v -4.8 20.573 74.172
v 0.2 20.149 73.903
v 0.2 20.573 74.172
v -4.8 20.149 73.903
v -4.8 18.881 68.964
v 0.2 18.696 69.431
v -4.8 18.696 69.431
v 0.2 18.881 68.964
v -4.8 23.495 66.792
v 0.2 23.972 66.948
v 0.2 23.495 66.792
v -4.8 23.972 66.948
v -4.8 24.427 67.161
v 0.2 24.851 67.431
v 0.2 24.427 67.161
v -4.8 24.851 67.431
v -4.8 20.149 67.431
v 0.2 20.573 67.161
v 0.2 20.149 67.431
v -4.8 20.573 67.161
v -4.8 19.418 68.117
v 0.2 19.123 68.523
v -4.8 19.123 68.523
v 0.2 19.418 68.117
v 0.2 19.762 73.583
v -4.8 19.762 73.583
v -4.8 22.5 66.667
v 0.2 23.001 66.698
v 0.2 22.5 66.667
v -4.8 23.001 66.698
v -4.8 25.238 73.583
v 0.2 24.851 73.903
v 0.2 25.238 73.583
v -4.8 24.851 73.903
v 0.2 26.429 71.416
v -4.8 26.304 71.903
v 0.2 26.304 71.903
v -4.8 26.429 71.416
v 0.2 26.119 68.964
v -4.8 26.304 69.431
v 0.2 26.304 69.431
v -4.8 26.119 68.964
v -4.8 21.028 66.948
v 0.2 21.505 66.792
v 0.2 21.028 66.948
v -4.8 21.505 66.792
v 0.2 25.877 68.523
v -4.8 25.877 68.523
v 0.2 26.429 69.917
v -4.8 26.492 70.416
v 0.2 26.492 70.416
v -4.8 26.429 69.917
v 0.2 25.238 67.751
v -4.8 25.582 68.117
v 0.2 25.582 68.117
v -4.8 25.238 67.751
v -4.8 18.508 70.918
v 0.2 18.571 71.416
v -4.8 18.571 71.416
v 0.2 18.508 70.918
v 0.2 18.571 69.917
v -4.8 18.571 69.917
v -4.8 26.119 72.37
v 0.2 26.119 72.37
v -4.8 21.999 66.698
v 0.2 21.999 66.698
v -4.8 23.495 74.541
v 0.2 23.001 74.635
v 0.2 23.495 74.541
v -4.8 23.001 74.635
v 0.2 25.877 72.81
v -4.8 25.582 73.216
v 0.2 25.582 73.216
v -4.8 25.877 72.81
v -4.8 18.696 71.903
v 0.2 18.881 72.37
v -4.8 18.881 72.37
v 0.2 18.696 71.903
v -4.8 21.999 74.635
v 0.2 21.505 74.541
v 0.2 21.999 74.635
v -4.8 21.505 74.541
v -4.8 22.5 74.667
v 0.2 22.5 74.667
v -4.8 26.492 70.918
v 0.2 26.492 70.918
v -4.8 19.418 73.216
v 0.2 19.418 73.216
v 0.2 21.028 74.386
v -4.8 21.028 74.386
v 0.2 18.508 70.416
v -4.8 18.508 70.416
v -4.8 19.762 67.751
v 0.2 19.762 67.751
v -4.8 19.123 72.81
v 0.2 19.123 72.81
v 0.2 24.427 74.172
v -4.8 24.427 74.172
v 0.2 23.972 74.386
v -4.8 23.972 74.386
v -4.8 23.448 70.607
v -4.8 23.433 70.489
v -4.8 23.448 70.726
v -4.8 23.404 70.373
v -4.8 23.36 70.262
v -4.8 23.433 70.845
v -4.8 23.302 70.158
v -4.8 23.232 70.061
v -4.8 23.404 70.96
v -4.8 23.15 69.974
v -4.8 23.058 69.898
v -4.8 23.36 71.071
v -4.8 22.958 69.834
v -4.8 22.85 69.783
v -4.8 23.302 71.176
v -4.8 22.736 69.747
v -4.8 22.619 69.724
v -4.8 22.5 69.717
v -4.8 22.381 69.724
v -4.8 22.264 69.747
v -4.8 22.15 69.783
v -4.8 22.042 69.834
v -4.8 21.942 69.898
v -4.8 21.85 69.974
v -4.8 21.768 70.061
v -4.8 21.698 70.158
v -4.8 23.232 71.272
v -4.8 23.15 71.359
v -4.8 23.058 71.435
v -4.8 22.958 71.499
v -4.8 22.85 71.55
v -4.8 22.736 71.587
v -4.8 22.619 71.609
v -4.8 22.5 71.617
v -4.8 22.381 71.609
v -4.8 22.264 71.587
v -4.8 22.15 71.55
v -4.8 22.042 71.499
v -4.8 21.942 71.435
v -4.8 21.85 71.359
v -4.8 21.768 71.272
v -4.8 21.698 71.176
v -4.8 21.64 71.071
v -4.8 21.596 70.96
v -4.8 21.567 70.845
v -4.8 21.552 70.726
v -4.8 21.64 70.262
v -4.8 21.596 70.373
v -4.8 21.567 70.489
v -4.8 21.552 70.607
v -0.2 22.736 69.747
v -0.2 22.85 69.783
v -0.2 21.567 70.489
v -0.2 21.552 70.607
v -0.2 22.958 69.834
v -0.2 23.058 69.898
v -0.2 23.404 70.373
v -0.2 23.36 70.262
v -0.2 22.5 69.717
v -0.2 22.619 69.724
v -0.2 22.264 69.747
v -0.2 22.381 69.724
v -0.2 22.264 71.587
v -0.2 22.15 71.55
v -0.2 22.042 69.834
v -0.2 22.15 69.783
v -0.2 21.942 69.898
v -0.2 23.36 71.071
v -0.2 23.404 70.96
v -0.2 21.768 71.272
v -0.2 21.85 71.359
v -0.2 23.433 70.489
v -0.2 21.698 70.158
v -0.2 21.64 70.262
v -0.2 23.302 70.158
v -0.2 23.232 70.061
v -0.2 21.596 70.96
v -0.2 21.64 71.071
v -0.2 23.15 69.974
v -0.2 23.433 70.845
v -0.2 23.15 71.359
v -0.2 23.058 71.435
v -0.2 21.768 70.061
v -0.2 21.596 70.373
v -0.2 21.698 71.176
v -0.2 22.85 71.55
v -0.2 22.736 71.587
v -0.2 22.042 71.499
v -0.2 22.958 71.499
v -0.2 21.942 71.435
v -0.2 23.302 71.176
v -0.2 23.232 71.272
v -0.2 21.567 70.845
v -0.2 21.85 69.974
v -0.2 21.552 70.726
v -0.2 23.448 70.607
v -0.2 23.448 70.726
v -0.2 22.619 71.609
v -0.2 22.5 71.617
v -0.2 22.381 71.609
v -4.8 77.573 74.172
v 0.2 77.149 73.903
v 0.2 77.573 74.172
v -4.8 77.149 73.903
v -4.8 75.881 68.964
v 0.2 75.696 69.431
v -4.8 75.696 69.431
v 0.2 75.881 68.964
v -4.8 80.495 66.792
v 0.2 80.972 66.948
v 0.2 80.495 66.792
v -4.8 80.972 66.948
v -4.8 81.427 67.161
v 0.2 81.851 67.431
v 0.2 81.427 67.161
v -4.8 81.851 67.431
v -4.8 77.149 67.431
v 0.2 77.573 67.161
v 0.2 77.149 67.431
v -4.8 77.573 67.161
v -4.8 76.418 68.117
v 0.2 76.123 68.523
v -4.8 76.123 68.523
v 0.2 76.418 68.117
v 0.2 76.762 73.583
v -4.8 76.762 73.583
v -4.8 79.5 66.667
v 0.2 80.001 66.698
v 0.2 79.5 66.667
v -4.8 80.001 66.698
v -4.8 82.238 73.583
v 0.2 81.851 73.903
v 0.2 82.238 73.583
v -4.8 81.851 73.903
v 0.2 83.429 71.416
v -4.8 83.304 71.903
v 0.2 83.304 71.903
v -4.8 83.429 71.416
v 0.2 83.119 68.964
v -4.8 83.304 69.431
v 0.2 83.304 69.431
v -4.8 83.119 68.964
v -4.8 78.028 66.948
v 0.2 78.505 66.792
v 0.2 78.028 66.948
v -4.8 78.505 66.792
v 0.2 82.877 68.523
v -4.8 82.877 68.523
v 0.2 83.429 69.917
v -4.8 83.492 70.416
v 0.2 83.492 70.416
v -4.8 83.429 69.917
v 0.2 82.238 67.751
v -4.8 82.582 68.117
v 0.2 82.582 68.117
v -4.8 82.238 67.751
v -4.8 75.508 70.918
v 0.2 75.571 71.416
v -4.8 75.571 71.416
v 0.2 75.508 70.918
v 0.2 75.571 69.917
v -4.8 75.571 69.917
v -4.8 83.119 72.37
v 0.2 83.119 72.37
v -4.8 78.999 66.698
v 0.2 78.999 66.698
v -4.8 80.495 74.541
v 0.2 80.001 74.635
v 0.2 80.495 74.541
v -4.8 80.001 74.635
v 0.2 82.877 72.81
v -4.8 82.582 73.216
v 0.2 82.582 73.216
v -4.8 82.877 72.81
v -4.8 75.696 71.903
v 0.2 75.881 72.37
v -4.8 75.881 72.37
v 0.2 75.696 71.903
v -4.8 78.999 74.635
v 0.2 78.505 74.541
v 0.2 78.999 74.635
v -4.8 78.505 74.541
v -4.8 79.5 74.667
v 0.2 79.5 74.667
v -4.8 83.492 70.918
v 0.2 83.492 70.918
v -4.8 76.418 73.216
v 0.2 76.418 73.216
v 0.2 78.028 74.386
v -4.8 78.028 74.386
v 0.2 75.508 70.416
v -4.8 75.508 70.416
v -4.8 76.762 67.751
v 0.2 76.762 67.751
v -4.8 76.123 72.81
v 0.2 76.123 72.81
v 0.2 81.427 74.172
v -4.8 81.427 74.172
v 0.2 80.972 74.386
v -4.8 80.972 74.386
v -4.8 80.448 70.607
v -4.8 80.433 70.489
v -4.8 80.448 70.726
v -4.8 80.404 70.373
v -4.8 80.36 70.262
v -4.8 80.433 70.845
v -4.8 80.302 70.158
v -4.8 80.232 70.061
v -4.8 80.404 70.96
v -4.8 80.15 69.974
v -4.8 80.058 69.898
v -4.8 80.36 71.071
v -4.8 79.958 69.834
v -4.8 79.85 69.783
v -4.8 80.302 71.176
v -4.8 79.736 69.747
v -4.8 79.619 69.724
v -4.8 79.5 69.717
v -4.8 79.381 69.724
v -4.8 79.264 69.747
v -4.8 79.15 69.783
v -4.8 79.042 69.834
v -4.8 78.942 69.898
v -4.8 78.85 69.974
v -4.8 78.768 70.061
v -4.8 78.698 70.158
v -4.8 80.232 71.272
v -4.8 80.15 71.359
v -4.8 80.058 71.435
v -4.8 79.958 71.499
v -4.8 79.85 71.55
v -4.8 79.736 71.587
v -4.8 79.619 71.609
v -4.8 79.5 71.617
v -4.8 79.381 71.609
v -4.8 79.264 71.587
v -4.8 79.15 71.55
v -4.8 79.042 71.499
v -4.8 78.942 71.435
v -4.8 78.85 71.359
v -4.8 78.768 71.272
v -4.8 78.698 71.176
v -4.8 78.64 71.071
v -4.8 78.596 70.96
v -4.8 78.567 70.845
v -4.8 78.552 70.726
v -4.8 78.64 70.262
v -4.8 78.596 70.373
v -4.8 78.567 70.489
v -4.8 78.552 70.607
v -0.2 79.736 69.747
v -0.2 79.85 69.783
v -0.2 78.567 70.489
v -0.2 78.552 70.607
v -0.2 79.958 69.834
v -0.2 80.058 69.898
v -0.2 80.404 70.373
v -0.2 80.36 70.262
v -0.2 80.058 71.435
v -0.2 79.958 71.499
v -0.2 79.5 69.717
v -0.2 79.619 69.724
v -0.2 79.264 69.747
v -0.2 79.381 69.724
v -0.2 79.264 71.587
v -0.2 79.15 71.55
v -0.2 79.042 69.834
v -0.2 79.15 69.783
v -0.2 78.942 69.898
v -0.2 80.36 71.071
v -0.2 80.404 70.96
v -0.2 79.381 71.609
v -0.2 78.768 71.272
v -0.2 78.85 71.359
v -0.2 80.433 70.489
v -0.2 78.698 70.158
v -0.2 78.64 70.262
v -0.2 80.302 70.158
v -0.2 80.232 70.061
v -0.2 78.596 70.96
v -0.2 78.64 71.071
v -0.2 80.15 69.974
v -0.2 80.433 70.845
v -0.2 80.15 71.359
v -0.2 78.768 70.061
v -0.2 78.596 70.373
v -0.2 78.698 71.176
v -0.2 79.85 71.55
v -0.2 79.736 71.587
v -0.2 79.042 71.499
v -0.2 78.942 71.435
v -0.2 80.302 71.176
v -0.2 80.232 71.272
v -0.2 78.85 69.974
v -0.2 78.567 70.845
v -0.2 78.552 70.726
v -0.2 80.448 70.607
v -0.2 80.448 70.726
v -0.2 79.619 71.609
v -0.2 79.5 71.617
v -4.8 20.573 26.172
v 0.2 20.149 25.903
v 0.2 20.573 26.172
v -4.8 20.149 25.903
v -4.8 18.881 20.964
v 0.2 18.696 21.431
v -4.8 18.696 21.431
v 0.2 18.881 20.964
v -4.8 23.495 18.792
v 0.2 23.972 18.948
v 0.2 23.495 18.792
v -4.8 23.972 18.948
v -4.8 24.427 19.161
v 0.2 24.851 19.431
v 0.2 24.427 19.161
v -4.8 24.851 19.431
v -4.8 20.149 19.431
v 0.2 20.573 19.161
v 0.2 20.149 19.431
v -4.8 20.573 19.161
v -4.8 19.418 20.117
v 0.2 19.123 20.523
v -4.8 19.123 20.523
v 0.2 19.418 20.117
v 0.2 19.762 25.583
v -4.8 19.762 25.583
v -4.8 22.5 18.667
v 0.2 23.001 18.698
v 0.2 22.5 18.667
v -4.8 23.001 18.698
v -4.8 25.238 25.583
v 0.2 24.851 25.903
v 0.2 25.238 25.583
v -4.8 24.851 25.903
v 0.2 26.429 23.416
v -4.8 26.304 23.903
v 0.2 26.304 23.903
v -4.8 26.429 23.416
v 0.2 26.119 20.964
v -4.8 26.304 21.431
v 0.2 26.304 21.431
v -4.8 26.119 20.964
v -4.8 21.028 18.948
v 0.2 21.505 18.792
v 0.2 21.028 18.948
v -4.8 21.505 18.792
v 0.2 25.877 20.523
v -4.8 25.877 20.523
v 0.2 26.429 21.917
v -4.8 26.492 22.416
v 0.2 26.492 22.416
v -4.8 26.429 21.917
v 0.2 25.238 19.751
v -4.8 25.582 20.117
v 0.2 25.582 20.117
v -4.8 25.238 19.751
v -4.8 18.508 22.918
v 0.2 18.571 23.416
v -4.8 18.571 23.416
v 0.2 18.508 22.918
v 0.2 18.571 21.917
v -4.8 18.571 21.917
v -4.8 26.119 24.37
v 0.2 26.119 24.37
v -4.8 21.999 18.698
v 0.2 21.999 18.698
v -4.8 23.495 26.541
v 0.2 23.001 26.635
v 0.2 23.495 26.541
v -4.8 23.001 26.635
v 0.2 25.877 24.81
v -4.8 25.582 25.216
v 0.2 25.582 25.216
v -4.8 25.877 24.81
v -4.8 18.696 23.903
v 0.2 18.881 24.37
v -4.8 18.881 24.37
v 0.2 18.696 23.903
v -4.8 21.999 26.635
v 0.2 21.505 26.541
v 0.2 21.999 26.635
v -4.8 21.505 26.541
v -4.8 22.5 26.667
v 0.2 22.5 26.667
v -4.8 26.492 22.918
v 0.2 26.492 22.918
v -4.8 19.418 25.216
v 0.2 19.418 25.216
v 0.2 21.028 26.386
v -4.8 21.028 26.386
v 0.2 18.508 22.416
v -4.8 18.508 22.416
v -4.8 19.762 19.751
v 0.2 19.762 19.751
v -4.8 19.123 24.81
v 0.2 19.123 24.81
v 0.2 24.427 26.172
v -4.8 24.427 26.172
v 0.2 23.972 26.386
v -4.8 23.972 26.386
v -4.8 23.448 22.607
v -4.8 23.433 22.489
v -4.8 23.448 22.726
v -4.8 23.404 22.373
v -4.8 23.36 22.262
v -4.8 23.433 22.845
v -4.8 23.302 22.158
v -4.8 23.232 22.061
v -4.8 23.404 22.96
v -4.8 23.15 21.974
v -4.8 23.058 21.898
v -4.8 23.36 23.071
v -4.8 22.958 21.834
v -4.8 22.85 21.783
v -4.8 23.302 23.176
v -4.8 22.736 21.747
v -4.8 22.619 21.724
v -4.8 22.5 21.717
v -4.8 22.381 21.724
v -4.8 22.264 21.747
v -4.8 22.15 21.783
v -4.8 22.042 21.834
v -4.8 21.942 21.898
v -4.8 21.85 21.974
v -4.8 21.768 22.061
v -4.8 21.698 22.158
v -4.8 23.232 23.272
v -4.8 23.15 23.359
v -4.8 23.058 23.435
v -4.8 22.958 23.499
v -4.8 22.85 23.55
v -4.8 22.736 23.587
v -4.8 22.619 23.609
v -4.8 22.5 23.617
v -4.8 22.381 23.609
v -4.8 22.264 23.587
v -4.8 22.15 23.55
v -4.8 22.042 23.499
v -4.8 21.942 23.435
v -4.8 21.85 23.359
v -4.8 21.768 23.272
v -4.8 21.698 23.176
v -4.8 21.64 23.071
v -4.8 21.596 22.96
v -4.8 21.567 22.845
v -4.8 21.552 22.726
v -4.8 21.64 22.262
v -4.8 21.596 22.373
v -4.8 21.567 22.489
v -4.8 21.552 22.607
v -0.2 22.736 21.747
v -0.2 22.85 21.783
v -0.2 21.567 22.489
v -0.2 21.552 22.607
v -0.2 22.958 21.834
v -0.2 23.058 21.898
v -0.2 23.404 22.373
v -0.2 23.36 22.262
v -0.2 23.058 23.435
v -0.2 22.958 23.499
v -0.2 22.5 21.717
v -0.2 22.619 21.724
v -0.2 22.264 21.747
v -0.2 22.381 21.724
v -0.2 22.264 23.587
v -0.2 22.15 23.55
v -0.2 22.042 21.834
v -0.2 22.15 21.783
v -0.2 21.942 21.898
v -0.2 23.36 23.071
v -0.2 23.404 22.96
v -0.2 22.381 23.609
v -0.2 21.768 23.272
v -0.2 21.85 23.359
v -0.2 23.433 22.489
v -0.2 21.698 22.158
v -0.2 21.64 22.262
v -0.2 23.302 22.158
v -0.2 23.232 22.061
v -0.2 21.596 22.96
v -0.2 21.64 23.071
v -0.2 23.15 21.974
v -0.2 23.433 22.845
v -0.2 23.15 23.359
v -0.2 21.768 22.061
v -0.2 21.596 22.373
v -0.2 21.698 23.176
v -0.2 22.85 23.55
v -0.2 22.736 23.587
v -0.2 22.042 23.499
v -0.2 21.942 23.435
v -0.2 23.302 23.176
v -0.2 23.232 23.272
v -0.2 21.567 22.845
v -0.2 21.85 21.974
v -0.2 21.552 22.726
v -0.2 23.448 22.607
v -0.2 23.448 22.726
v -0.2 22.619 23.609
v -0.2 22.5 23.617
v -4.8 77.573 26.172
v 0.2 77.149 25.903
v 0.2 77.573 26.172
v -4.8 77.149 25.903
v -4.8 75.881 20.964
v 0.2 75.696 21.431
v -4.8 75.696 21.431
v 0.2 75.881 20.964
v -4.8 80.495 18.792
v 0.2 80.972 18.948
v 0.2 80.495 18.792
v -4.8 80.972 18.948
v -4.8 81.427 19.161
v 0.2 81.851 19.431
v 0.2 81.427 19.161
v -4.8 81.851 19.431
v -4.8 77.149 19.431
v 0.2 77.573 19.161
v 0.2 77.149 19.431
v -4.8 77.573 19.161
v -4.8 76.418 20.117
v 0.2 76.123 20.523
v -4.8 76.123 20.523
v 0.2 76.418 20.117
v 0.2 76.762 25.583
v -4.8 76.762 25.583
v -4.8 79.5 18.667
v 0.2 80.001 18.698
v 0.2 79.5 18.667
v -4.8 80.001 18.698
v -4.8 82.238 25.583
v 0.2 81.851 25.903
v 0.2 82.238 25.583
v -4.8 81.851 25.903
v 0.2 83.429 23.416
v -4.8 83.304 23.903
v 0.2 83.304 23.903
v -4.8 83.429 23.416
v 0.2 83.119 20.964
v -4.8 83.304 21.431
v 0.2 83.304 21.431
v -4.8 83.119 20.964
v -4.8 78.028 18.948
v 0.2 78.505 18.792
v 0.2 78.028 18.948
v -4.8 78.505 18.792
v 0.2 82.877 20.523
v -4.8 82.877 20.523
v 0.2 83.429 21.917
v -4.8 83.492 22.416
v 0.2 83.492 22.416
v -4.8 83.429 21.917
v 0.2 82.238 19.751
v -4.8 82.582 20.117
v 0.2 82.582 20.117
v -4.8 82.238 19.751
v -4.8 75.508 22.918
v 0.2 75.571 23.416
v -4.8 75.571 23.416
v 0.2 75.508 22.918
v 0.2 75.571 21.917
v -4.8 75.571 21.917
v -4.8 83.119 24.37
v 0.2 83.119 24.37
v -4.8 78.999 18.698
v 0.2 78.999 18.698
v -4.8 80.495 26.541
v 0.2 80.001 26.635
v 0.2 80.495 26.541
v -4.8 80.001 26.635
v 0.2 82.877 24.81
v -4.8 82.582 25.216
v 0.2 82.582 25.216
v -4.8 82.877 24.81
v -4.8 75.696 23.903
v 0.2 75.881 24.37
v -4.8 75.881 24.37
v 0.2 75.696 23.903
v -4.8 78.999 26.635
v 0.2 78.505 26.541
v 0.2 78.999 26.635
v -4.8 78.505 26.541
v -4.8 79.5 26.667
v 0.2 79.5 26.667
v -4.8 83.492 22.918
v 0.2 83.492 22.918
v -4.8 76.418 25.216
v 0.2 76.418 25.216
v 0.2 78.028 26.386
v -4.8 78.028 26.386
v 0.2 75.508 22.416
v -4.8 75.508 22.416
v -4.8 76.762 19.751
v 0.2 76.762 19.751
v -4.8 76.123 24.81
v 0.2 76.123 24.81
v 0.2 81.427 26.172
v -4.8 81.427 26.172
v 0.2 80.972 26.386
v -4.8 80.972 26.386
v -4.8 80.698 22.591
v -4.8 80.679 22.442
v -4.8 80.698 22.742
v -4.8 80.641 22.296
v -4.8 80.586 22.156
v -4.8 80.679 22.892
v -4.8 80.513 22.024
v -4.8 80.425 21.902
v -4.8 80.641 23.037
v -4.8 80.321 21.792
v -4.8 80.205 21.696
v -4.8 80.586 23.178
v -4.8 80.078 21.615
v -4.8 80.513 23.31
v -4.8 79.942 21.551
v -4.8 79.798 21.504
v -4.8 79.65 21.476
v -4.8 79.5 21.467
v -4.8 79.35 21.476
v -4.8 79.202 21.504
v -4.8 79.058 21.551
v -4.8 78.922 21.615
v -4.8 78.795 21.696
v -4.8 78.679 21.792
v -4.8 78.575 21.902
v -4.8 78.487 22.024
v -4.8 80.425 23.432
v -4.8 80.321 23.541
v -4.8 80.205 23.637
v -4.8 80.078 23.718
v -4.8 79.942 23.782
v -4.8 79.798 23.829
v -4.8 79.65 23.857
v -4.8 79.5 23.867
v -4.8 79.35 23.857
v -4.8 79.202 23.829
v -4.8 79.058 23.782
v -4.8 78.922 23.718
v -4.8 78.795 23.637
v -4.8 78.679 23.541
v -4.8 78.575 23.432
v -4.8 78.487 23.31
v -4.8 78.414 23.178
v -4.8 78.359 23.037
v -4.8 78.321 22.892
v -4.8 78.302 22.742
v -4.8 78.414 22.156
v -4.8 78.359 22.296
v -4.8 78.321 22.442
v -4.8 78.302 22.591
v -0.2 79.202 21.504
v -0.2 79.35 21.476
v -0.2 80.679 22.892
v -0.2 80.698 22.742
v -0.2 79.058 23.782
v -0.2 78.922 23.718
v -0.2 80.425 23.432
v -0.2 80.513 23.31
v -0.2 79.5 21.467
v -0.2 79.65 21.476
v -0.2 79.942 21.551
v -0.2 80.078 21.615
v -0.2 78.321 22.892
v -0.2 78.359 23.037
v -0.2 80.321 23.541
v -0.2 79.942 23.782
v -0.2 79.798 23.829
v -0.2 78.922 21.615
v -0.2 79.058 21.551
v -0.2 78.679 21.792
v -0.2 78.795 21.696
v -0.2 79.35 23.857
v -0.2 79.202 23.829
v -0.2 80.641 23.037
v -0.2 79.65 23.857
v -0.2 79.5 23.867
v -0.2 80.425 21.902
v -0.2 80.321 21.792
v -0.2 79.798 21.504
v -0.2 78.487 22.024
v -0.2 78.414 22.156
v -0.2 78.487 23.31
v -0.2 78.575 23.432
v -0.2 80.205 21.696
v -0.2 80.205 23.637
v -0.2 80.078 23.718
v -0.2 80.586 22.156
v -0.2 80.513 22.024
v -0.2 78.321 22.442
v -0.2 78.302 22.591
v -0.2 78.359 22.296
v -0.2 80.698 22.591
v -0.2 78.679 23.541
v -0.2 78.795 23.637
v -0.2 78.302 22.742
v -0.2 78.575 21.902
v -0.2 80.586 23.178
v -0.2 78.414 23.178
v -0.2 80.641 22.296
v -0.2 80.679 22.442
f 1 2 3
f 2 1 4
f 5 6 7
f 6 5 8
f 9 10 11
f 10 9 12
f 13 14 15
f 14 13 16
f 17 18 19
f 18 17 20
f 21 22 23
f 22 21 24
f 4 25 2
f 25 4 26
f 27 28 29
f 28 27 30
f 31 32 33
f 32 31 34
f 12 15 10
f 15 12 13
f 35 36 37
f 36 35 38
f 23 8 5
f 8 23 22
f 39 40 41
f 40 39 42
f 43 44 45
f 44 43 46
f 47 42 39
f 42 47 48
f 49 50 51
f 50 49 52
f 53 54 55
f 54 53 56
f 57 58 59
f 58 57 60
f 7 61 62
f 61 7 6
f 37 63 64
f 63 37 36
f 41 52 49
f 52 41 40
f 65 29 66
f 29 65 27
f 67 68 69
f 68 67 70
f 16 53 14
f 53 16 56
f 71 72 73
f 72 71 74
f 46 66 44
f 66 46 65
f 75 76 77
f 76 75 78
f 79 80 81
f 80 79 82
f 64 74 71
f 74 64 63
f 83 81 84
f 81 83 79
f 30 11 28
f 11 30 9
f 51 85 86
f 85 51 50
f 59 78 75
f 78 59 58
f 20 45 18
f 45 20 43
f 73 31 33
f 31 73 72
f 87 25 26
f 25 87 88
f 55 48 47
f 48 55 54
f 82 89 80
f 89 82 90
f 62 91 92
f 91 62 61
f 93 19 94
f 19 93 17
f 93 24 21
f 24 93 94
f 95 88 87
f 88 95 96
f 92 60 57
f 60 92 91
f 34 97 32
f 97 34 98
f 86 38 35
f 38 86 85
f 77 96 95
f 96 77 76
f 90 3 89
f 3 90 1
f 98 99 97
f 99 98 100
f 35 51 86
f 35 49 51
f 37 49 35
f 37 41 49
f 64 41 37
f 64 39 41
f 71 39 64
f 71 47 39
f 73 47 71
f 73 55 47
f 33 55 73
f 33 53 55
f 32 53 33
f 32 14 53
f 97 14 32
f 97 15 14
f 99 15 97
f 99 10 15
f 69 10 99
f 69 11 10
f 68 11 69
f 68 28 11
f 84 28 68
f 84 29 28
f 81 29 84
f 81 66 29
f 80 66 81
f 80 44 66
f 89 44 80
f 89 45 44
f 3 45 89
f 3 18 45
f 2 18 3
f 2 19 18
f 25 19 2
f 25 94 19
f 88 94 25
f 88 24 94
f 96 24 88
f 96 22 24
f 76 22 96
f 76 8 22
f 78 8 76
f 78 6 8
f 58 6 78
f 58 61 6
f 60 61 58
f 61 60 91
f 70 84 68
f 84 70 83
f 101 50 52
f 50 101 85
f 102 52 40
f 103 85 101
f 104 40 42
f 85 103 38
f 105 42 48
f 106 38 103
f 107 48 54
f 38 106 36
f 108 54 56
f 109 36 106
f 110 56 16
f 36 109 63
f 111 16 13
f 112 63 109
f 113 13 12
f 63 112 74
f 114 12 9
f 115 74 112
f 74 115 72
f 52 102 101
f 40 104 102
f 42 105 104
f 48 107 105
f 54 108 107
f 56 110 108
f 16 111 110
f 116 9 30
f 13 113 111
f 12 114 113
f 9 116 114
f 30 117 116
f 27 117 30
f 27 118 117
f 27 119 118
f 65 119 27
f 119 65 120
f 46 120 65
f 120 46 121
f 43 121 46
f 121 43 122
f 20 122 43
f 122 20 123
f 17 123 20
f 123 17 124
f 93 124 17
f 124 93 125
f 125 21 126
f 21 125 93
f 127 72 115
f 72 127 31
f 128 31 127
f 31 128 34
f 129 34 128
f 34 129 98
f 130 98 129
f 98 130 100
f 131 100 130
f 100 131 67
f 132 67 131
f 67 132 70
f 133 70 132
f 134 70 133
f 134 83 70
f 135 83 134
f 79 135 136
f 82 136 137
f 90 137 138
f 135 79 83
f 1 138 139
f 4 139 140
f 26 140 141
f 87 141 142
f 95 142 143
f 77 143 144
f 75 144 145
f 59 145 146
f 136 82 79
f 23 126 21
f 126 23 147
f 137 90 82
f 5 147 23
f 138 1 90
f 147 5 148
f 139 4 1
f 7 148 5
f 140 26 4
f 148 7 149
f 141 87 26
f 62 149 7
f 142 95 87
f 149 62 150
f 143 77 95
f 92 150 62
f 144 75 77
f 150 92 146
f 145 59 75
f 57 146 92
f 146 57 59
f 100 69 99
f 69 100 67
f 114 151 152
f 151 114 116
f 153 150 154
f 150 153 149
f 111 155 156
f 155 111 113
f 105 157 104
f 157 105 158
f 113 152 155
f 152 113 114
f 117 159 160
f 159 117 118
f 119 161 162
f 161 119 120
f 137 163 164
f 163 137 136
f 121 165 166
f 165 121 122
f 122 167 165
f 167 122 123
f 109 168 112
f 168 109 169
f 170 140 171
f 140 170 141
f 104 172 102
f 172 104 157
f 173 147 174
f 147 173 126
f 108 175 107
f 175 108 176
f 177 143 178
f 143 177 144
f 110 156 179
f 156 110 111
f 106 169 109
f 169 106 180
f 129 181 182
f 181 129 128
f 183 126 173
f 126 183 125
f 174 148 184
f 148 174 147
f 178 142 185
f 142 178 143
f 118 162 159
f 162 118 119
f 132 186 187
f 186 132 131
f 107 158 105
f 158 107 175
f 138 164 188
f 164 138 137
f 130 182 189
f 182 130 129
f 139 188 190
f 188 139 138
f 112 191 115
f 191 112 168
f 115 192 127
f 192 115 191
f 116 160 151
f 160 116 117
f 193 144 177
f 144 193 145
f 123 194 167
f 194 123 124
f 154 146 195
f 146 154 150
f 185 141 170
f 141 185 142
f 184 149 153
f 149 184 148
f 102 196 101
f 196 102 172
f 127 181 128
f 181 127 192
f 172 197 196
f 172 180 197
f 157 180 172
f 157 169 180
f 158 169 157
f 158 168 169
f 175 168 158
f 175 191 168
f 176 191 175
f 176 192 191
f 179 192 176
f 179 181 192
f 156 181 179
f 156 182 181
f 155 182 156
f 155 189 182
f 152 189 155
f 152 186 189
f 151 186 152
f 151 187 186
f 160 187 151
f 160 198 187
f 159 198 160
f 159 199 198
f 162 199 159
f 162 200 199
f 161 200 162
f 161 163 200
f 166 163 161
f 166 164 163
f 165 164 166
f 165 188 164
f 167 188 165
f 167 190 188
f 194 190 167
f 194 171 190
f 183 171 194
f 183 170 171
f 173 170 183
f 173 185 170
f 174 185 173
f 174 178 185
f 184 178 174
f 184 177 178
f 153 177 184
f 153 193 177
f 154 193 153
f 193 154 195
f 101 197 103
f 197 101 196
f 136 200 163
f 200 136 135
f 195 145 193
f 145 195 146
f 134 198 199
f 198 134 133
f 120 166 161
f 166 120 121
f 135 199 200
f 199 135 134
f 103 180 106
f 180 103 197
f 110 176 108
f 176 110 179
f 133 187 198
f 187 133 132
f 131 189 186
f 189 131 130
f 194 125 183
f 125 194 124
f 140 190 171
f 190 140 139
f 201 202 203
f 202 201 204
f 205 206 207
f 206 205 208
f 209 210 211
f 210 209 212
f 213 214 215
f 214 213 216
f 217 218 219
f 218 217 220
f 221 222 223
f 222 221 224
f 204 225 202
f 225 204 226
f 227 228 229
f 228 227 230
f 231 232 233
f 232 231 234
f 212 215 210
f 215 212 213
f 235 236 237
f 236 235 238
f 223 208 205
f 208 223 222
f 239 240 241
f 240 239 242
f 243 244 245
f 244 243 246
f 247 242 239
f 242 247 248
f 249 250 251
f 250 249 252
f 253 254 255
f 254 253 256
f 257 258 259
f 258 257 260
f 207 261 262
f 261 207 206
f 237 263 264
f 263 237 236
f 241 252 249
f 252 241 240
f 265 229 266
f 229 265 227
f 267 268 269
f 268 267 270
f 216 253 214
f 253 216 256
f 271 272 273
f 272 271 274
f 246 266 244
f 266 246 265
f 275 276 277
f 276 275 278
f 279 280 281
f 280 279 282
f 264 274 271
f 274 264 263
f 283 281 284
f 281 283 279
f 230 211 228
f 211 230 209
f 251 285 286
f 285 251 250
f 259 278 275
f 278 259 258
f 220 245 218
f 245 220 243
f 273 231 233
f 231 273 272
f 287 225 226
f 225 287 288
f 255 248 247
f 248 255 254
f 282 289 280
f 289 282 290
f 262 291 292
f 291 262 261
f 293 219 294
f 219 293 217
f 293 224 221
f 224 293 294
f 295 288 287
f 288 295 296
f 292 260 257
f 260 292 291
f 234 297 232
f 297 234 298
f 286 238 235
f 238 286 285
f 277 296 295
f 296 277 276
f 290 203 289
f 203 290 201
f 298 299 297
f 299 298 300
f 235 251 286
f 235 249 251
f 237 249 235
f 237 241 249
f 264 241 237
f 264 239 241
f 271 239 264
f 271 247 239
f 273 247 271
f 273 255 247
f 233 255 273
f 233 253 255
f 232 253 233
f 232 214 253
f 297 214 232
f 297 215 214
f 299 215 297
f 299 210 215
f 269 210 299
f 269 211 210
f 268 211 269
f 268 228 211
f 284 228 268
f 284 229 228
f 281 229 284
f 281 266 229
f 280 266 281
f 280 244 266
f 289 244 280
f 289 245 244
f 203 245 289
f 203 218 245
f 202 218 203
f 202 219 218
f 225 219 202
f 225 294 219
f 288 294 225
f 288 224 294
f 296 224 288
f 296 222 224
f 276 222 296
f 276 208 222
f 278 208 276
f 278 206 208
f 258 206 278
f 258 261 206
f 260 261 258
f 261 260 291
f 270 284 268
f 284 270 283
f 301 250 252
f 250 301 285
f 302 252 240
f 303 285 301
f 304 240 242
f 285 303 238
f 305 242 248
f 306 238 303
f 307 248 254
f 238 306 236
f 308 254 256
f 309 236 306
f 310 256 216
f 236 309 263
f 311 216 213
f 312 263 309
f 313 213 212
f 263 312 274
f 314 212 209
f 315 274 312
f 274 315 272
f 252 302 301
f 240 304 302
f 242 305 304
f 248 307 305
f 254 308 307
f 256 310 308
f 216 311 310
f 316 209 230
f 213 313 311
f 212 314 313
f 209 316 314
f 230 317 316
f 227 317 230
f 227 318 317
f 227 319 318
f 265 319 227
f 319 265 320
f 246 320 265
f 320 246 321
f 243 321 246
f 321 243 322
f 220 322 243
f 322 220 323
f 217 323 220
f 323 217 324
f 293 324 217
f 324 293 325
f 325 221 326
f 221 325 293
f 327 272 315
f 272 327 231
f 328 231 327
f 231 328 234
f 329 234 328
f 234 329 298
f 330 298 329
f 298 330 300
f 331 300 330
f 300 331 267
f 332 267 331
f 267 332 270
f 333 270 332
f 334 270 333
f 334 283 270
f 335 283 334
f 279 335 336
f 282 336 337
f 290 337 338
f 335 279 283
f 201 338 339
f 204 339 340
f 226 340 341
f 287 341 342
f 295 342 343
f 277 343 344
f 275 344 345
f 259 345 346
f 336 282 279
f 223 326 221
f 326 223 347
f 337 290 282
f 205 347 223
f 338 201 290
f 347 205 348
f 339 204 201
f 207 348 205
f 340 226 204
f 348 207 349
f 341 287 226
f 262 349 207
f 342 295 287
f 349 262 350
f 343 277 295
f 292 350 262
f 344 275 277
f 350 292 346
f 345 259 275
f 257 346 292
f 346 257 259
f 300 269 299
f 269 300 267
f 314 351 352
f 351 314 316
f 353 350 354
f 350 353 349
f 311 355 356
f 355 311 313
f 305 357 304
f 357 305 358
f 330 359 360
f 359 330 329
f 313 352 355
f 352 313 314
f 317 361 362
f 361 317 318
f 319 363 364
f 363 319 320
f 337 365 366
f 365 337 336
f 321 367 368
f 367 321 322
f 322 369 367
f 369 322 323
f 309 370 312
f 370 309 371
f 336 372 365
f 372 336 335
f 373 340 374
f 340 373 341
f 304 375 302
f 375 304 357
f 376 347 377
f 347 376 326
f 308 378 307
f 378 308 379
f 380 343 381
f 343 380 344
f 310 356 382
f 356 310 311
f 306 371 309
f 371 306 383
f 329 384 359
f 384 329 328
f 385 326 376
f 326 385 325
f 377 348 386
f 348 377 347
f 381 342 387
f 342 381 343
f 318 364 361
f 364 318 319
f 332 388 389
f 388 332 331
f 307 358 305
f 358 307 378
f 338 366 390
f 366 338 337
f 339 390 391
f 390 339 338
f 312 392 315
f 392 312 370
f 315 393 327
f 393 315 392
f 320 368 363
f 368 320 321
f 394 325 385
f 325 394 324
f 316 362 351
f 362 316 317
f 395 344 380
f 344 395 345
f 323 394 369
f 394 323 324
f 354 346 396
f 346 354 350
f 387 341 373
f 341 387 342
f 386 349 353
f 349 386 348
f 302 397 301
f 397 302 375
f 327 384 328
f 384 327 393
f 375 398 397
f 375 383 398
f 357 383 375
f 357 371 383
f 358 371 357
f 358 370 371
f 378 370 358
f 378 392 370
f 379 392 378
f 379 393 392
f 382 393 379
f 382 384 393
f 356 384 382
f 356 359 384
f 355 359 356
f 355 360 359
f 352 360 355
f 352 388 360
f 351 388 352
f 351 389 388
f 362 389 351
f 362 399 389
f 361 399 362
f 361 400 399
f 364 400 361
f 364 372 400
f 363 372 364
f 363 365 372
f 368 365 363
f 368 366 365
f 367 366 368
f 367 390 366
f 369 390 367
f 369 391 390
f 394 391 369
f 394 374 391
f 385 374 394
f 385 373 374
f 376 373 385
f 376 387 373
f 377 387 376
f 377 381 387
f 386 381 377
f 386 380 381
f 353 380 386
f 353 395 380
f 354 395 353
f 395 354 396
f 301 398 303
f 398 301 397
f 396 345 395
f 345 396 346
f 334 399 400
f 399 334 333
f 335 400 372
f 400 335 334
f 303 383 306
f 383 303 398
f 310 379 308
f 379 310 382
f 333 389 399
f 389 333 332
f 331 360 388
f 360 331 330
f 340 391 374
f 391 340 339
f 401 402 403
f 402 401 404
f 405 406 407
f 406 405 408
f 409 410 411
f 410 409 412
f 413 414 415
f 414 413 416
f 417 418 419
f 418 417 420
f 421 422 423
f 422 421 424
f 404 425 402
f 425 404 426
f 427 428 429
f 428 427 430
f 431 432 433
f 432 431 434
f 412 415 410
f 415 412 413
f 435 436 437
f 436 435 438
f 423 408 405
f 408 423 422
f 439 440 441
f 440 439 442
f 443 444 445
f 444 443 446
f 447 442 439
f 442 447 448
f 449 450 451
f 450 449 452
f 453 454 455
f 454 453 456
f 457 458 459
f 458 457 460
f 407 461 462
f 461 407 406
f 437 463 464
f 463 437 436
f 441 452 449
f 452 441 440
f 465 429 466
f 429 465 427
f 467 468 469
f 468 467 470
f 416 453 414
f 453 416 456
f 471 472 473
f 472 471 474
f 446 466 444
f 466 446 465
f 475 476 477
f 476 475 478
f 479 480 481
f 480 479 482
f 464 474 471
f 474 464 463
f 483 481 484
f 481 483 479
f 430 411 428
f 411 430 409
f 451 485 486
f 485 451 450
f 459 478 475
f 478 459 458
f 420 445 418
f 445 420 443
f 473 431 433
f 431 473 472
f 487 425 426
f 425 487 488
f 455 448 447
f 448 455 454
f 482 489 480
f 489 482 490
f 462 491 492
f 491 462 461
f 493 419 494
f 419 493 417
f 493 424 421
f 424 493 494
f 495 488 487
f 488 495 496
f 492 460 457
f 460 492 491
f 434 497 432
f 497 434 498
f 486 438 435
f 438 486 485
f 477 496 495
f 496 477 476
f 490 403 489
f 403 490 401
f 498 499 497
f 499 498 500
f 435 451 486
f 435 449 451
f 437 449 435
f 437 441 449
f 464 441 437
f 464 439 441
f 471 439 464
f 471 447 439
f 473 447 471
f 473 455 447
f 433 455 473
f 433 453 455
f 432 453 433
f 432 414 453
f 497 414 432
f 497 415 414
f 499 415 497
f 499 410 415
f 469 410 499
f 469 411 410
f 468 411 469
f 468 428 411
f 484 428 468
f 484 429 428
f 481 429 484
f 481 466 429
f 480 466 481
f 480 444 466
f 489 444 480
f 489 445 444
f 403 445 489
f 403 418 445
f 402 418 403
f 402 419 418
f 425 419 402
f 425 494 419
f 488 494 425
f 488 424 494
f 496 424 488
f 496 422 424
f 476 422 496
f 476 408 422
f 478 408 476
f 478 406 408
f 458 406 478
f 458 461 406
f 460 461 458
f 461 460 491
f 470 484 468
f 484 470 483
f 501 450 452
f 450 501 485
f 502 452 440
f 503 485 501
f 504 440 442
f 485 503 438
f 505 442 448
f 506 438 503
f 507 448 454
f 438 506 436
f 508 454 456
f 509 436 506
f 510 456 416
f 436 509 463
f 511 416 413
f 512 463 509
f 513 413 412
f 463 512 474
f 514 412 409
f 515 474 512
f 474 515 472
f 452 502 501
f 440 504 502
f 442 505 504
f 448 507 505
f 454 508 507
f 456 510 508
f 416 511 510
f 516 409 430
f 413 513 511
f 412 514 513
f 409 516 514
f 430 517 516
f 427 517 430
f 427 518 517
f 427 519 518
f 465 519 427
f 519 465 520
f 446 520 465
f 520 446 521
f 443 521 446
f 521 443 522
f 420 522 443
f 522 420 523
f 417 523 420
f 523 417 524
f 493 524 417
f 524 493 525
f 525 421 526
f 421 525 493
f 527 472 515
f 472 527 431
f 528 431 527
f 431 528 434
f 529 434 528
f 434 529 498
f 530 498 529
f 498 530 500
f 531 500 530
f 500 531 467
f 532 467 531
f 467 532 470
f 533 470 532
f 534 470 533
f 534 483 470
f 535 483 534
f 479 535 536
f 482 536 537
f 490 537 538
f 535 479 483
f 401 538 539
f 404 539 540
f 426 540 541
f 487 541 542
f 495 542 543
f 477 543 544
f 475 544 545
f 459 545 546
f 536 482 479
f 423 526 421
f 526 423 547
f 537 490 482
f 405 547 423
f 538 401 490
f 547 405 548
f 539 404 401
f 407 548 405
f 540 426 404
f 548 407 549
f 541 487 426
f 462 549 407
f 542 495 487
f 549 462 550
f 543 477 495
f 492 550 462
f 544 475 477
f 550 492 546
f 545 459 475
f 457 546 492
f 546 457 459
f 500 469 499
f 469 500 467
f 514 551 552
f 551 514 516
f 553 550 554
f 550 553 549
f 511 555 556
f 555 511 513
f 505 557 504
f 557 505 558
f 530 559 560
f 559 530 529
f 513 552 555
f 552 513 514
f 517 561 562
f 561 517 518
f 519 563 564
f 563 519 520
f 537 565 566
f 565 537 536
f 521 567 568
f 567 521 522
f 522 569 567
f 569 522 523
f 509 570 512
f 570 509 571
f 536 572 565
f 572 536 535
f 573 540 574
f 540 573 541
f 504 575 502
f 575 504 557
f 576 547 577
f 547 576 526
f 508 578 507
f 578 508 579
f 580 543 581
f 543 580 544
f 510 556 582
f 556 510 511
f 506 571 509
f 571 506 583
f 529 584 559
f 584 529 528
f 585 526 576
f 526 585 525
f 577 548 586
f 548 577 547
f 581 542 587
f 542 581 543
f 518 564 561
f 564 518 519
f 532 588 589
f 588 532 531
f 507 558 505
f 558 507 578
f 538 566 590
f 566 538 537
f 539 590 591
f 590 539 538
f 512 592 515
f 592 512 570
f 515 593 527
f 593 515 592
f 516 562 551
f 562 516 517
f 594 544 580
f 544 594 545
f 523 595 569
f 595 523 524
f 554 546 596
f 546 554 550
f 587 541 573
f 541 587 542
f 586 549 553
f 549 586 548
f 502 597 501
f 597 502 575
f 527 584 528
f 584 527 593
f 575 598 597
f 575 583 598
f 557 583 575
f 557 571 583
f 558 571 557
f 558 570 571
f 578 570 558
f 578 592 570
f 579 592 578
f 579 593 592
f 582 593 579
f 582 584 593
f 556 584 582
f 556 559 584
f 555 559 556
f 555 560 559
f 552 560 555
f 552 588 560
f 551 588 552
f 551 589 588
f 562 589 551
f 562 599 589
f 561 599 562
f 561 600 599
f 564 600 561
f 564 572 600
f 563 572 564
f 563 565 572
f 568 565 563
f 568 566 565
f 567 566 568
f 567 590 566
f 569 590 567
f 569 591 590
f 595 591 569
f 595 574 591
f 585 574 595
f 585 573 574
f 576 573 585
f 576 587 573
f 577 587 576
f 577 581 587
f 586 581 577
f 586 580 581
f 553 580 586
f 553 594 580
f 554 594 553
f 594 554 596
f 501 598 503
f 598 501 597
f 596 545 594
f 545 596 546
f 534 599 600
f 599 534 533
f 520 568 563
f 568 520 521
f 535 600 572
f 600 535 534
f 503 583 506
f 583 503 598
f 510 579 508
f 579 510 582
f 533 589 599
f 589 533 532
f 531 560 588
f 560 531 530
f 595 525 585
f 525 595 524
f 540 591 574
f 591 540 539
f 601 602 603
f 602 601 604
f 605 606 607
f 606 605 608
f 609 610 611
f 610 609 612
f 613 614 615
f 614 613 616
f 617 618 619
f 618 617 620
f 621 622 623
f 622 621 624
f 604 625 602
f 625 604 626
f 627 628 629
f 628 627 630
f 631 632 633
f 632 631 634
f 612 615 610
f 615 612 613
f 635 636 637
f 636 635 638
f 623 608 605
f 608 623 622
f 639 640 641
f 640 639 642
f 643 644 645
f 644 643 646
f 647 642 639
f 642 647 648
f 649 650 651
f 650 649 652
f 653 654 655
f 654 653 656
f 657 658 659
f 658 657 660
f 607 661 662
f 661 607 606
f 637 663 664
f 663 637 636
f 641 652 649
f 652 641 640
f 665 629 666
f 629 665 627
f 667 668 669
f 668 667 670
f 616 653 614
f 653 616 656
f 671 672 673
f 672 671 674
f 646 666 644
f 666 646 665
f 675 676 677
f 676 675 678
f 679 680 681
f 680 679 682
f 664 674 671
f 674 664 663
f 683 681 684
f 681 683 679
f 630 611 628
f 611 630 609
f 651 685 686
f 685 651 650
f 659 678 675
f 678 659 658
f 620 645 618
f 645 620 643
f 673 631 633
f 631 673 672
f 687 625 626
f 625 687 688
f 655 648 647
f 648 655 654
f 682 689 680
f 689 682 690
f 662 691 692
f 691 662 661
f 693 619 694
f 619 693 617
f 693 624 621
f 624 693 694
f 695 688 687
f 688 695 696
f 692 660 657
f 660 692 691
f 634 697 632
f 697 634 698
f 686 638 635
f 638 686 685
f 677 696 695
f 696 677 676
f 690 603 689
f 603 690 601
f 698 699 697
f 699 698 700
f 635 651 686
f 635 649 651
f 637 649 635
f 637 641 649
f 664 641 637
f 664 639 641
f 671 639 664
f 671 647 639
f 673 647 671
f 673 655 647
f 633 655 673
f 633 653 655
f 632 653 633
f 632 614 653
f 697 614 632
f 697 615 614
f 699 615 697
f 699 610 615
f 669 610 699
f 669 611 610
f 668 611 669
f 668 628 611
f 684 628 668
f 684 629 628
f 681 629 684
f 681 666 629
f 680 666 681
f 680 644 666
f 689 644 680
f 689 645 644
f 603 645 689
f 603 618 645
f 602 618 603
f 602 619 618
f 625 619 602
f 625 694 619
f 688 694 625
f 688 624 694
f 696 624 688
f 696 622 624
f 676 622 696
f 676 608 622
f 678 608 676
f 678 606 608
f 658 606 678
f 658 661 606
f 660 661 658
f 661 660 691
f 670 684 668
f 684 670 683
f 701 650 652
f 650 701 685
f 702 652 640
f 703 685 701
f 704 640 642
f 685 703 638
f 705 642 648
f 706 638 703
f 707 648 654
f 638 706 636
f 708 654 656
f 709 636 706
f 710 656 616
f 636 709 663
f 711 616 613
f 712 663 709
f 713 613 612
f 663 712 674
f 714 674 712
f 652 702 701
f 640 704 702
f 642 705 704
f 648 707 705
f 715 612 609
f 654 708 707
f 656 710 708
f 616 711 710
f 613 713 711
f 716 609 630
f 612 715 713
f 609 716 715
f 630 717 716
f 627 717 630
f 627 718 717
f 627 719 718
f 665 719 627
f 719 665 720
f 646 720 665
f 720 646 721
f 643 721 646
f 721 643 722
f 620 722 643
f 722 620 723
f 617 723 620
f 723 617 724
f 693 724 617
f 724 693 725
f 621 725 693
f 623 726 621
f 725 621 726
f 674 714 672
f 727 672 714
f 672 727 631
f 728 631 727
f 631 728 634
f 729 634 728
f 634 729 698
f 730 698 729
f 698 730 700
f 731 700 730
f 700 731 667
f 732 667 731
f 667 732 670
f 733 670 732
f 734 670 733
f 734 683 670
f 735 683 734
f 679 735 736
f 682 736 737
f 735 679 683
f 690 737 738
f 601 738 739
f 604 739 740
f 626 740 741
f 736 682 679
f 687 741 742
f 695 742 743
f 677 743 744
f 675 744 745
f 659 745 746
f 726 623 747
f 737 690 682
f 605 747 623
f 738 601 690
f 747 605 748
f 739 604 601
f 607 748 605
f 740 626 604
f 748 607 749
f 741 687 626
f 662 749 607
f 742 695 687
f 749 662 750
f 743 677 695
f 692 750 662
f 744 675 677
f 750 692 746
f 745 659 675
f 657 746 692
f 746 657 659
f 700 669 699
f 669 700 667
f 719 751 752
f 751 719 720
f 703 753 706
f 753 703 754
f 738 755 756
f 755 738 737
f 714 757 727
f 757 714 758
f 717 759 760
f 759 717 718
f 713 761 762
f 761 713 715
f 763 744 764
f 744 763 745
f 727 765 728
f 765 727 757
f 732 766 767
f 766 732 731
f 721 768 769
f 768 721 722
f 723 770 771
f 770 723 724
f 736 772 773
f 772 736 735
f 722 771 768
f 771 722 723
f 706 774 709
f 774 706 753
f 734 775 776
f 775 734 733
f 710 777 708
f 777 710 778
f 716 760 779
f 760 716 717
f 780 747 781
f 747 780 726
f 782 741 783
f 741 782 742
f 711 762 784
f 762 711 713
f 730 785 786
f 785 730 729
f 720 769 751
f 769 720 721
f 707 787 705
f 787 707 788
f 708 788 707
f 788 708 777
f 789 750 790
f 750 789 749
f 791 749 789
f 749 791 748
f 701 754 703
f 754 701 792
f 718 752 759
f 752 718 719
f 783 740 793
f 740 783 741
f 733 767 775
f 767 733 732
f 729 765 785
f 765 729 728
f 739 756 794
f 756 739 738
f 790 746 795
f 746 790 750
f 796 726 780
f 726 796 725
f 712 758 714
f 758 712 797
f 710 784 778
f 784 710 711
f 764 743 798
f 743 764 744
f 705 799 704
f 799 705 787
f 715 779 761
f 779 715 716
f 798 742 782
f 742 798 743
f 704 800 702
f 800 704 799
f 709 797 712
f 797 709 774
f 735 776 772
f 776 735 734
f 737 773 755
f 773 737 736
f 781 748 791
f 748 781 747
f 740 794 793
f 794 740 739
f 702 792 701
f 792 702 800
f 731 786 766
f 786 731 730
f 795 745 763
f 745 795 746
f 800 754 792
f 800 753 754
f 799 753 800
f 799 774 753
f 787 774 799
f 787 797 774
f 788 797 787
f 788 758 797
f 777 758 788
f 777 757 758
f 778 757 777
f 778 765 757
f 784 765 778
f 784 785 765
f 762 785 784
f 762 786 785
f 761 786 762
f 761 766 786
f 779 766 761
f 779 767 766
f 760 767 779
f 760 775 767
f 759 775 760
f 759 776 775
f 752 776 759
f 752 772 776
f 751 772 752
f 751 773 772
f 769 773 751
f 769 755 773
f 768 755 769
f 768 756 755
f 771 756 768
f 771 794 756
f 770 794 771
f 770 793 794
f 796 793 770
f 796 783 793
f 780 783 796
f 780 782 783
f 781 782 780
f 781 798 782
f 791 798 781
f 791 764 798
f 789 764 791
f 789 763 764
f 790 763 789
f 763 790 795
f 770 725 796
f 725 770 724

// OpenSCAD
// file: ../robot_settings.scad
main_box_x = 95; // 96
main_box_y = 102;
main_box_z = 74; // 74.5
wall_thickness = 2;

rail_gap = 2;
rail_inset = 7;

rail_thickness = 7;
rail_length = 250;
rail_width = 250;

raspberry_pi_screw_seperation_y = 57;
raspberry_pi_screw_seperation_z = 48;
raspberry_pi_peg_h = 5;

battery_box_peg_h = 6;
battery_box_peg_d = 8;
battery_box_peg_cutout = 5;

gears_module = 1;
pinion_gear_teeth = 32;
pinion_gear_width = 5;
pinion_gear_bore = 8;

gears_setback_distance = 25;
gear_post_height = 2 * pinion_gear_width + rail_thickness + 8 ;

steering_motor_mount_x = 45;
steering_motor_mount_y = 36;
steering_motor_mount_z = 18;
steering_motor_mount_setback_distance = gears_setback_distance + 16;

dc_motor_drivertype = "Teyleten"; // Teyleten
isAdafruit = (dc_motor_drivertype == "Adafruit");

drv8871_x = isAdafruit ? 20.3 : 21.6;
drv8871_y = isAdafruit ?  24 : 25;

drv8871_z = 2;
drv8871_screw_d = 2.5;
drv8871_solder_points_z = 2;

drv8871mount_edge_x = 1.5;
drv8871mount_edge_wall = 3;
drv8871mount_z = 5;
drv8871mount_x = drv8871_x +  drv8871mount_edge_wall - 2* drv8871mount_edge_x;
drv8871mount_y = 19;

drv8871_screw_distance = 15.64;
drv8871_solder_points_d = 1.66;
drv8871_solder_offset_y = 4.4;
drv8871_solder_inner_points_distance = 5;
drv8871_solder_outer_points_distance = 12;

dc_motor_housing_minus_encoder_z = 48;
dc_motor_encoder_z = 9.33;
dc_motor_encoder_wheel_d = 13.4;
dc_motor_encoder_wheel_thickness = 5;
dc_motor_encoder_wheel_gap = 3;
dc_motor_encoder_circuit_thickness = 2;
dc_motor_cutout_d = 24.8;
dc_motor_cutout_z = 19.5;

dc_motor_screw_head_z = 2;
dc_motor_screw_head_d = 5.6;
dc_motor_screw_d = 3.2;
dc_motor_screw_offset = 8.5;

dc_motor_axle_ring_z = 3;
dc_motor_axle_ring_d = 7.2;
dc_motor_axle_cutout_d = 4.2;
dc_motor_axle_cutout_z = 10;
dc_motor_axle_notch_cutout = 0.4;
dc_motor_axle_notch_cutout_z = 6;

pdmount_x = 20;
pdmount_y = 30;
pdmount_z = 2;
pdmount_edge_x = 1.5;
pdmount_edge_wall = 3;

steering_shaft_z = 45;
steering_shaft_d = 7;
steering_shaft_motor_fitting_d = 9;
coupler_length = 24.6;
coupler_diameter = 14;
coupler_screw_d = 4;
coupler_screw_z_offset = 5;
coupler_gear_side_insert = 12.6;
steering_shaft_with_coupler_z = steering_shaft_z - coupler_gear_side_insert;

lidar_mount_y = 110;
lidar_mount_x = 65 + 20;
lidar_narrow_screws = 40;
lidar_wide_screws = 56;
lidar_front_to_back_screws = 70;
lidar_screw_d = 3;
lidar_circuitboard_x = 20;
lidar_circuitboard_y = 35;
lidar_circuitboard_z = 1.2;
lidar_cord_length = 29;

ball_bearing_height = 7;
ball_bearing_outer_diameter = 22;
ball_bearing_inner_diameter = 8;

M4_diameter = 5.1;
M3_diameter = 2.9;
M3_length = 35;
M3_cap_length= 3;
M3_cap_diameter = 5.44;

suspension_spring_outer_diameter = 8;
suspension_spring_inner_diameter = 5.3;

armature_holder_height = 20;
armature_holder_thickness = 8;
pull_bar_peg_r = 3.2;
apparatus_locking_peg_d = 4;

rack_module = 1;
rack_length = main_box_x;
rack_height = 5;
rack_width = 10;
rack_teeth = 30;
rack_bore = 3;

pull_bar_length = rail_width / 2 - rack_length + 1;

// tire hardware
axle_length = 24 + ball_bearing_height; 
axle_reciever_inner_diameter = 8.2;
axle_reciever_outer_diameter = 12;
axle_reciever_length = 18.8;
axle_notch_length = 15;
axle_notch_cutout = 2.4;

// power distribution bar
power_bar_cutout_x = 96;
power_bar_y = 19.1;
power_bar_z = 1.5;
power_bar_screw_distance = 91.4;
power_bar_screw_d = 2.8;
power_bar_standoff_z = 5;
power_bar_standoff_d = 6.83;

pico_expander_width = 63;
pico_expander_height = 57;
pico_screw_hole_offset = 3;
pico_screw_hole_d = 2.5;

usbhub_thickness = 11.7;
usbhub_depth = 37.5;
usbhub_width = 86.7;
usbhub_end_port_width = 14.8;
usbhub_end_port_height = 12;
usbhub_front_face_safe_zone_left = 15;
usbhub_front_face_safe_zone_right = 14.8;

switch_w = 16;
switch_cutout_d = 12.2;
switch_bump_h = 2;
switch_bump_l = 18.2;
// main file
include <../robot_settings.scad>
$fn = 50;

module RP5() {

 difference() {
    translate([
              -raspberry_pi_peg_h + .2, 
              main_box_y / 2 - raspberry_pi_screw_seperation_y / 2, 
              main_box_z / 2 - main_box_z /6 + main_box_z / 2 + 9])
    rotate([0,90,0])
    cylinder(h = raspberry_pi_peg_h, d = ball_bearing_inner_diameter);
    
    // screw hole
    translate([
              -raspberry_pi_peg_h - .2, 
              main_box_y / 2 - raspberry_pi_screw_seperation_y / 2, 
              main_box_z / 2 - main_box_z /6 + main_box_z / 2 + 9])
    rotate([0,90,0])
    cylinder(h = raspberry_pi_peg_h, d = power_bar_screw_d / 2 +.5);
  }

  // rp5 mounting pegs - top left
  difference() {
    translate([
              -raspberry_pi_peg_h + .2,
              main_box_y / 2 + raspberry_pi_screw_seperation_y / 2, 
              main_box_z / 2 - main_box_z /6 + main_box_z / 2 + 9])
    rotate([0,90,0])
    cylinder(h = raspberry_pi_peg_h, d = ball_bearing_inner_diameter);

    // screw hole
    translate([
              -raspberry_pi_peg_h - .2,
              main_box_y / 2 + raspberry_pi_screw_seperation_y / 2, 
              main_box_z / 2 - main_box_z /6 + main_box_z / 2 + 9])
    rotate([0,90,0])
    cylinder(h = raspberry_pi_peg_h, d = power_bar_screw_d / 2 + .5);
  }

  // rp5 mounting pegs - bottom right
  // rp5 mounting pegs - top right
  difference() {
    translate([
              -raspberry_pi_peg_h + .2, 
              main_box_y / 2 - raspberry_pi_screw_seperation_y / 2, 
              main_box_z / 2 - main_box_z /6 + main_box_z / 2 - raspberry_pi_screw_seperation_z + 9])
    rotate([0,90,0])
    cylinder(h = raspberry_pi_peg_h, d = ball_bearing_inner_diameter);
    
    // screw hole
    translate([
              -raspberry_pi_peg_h - .2, 
              main_box_y / 2 - raspberry_pi_screw_seperation_y / 2, 
              main_box_z / 2 - main_box_z /6 + main_box_z / 2 - raspberry_pi_screw_seperation_z + 9])
    rotate([0,90,0])
  cylinder(h = raspberry_pi_peg_h, d = power_bar_screw_d / 2 + .5);  
  }

  // rp5 mounting pegs - bottom left
  difference() {
  translate([
            -raspberry_pi_peg_h + .2,
            main_box_y / 2 + raspberry_pi_screw_seperation_y / 2, 
            main_box_z / 2 - main_box_z /6 + main_box_z / 2 -raspberry_pi_screw_seperation_z + 9])
  rotate([0,90,0])
  cylinder(h = raspberry_pi_peg_h, d = ball_bearing_inner_diameter);

  translate([
            -raspberry_pi_peg_h - .2,
            main_box_y / 2 + raspberry_pi_screw_seperation_y / 2, 
            main_box_z / 2 - main_box_z /6 + main_box_z / 2 -raspberry_pi_screw_seperation_z + 9])
  rotate([0,90,0])
  cylinder(h = raspberry_pi_peg_h, d = power_bar_screw_d / 2 + 1);
  }
}
RP5();
  
